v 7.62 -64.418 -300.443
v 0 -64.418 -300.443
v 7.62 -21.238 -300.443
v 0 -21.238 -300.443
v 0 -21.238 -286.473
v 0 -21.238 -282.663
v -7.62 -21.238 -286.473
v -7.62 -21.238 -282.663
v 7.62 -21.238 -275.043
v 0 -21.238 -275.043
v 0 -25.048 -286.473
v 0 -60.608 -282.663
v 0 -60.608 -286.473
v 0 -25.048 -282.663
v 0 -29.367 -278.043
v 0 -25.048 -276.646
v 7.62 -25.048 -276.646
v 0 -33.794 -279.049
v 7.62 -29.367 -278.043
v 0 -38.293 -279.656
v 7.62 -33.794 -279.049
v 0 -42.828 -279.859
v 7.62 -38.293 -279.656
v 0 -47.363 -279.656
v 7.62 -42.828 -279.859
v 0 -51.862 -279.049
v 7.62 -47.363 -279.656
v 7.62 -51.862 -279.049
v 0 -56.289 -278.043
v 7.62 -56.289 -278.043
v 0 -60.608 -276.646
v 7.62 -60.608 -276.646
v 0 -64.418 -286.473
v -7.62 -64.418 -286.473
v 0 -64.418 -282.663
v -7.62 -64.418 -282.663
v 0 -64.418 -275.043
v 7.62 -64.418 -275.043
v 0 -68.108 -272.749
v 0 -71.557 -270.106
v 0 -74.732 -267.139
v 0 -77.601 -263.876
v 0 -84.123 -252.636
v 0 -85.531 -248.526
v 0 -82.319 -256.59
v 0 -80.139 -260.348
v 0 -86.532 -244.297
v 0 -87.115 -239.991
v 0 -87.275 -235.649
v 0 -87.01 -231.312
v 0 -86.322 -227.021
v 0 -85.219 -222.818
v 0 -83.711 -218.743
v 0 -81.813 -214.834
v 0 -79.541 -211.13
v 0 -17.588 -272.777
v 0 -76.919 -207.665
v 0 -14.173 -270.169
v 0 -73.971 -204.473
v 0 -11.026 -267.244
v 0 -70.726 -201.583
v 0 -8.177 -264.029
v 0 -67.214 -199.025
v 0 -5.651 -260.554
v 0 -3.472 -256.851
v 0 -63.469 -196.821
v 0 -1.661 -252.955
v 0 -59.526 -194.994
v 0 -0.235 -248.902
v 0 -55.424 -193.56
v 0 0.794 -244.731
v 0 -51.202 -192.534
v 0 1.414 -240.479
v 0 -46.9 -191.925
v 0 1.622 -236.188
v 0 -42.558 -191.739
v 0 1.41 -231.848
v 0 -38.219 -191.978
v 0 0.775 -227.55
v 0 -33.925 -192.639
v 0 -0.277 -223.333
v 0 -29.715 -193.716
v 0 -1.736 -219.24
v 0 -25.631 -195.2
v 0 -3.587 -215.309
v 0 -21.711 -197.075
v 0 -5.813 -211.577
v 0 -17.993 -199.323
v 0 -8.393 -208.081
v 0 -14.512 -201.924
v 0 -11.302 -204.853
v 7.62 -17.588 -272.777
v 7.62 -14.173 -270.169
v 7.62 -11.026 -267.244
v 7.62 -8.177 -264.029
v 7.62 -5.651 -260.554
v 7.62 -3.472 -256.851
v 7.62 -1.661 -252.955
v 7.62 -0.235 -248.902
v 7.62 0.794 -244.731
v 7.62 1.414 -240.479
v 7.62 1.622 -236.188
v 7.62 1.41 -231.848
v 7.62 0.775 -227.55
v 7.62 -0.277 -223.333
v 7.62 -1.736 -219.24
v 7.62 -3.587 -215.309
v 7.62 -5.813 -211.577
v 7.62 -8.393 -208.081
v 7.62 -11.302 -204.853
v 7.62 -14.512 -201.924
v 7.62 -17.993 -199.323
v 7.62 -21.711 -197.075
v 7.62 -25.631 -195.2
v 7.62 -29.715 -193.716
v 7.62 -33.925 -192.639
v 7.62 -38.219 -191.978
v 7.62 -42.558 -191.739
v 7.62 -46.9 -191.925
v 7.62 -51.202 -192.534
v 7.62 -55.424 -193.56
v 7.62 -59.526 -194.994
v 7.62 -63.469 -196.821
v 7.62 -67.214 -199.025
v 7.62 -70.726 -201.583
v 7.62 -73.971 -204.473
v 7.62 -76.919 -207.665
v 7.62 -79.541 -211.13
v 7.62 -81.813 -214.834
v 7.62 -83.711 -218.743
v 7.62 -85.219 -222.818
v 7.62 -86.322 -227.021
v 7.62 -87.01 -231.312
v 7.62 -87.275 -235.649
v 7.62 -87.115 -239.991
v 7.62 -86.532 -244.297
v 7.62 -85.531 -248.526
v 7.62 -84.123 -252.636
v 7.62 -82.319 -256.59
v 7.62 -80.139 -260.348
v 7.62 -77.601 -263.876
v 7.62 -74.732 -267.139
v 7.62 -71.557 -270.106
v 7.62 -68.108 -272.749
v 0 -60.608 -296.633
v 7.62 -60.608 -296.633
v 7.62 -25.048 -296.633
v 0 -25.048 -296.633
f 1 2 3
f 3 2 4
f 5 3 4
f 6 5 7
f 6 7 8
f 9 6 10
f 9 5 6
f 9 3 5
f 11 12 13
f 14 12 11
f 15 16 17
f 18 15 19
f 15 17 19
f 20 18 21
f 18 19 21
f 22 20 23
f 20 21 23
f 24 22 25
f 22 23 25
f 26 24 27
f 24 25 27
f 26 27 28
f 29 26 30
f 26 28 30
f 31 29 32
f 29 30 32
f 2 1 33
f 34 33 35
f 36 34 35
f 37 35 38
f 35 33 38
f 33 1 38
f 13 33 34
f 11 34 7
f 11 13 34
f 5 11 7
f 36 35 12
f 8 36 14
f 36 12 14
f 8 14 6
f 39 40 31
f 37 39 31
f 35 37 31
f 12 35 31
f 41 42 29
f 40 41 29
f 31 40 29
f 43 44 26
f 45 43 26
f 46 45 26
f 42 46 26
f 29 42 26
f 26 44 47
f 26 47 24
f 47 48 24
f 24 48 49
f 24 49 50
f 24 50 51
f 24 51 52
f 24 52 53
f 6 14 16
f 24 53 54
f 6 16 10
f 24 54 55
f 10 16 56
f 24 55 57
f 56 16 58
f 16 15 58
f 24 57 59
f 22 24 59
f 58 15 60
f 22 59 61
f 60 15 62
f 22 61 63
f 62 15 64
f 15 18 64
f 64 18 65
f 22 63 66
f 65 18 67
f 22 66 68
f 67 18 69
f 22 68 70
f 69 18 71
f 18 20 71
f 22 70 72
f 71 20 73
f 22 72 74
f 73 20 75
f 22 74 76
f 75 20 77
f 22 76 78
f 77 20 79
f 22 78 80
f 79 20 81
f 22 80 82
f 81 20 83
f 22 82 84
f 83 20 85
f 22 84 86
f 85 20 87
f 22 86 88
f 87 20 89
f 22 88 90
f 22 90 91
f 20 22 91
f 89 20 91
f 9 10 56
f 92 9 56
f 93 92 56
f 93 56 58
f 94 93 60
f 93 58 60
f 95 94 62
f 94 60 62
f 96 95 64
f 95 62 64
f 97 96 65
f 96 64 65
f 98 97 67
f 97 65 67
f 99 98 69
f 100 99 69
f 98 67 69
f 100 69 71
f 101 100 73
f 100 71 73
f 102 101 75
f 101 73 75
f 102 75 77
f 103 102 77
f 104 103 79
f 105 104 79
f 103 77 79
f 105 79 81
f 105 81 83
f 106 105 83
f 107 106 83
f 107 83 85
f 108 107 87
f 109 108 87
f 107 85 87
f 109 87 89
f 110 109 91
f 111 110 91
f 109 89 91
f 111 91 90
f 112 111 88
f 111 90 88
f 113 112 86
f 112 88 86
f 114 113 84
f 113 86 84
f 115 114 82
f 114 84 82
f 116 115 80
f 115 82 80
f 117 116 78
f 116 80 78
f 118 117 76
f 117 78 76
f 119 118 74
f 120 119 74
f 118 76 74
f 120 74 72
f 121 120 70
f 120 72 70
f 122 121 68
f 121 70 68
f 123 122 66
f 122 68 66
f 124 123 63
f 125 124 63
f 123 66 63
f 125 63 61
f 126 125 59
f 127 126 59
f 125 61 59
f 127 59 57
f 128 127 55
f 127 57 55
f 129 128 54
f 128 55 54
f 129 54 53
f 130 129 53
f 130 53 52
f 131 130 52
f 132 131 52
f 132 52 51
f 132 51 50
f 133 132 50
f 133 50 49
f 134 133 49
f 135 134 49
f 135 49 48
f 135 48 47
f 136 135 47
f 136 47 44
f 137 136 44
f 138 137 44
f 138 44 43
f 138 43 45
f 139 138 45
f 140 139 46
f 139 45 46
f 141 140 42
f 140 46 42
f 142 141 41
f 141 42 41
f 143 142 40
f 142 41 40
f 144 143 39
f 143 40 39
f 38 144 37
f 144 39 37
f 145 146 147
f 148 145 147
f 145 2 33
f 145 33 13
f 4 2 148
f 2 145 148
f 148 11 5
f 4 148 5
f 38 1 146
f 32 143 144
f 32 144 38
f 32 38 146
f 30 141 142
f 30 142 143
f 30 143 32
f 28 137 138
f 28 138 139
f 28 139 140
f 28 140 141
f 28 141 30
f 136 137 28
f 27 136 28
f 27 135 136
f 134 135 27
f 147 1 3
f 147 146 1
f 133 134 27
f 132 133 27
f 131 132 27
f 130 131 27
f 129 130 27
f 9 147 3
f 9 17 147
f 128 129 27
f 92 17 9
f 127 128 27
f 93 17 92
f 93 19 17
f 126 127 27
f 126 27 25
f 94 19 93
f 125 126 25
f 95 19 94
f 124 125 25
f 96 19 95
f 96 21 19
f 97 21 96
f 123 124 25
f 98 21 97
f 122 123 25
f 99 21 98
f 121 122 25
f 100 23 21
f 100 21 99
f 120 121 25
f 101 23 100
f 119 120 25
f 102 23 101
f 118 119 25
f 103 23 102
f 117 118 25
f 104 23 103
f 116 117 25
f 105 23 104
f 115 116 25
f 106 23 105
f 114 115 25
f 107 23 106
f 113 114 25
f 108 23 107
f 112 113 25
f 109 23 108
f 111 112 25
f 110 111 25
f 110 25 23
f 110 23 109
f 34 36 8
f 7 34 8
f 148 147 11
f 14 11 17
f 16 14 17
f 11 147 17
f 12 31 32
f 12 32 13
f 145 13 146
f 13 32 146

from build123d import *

# Parameters (mm, degrees)
F0_R     = 31.75
F0_W     = 43.18
F0_H     = 13.97
F0_H_2   = 3.81
F1_DEPTH = 7.62
F3_DEPTH = 7.62
F4_DEPTH = 76.2
F5_DEPTH = 7.62


with BuildPart() as f1:
    # F0 (on Right) → F1 (new body)
    with BuildSketch(Plane.YZ):
        with BuildLine():
            ThreePointArc((-21.2379042244, -275.0427409069), (-4.5168222767, -258.7284761869), (1.6220957756, -236.1882122133))
            ThreePointArc((1.6220957756, -236.1882122133), (-65.368168198, -197.8771302656), (-64.4179042244, -275.0427409069))
            Line((-64.4179042244, -275.0427409069), (-21.2379042244, -275.0427409069))
        make_face()
        with Locations((-42.8279042244, -236.1882122133)):
            Circle(F0_R, mode=Mode.SUBTRACT)
        with Locations((-42.8279042244, -236.1882122133)):
            Circle(F0_R)
        with Locations((-42.8279042244, -293.4577409069)):
            Rectangle(F0_W, F0_H)
        with BuildLine():
            ThreePointArc((-21.2379042244, -275.0427409069), (-42.8279042244, -280.6382122133), (-64.4179042244, -275.0427409069))
            Line((-64.4179042244, -275.0427409069), (-64.4179042244, -282.6627409069))
            Line((-64.4179042244, -282.6627409069), (-21.2379042244, -282.6627409069))
            Line((-21.2379042244, -282.6627409069), (-21.2379042244, -275.0427409069))
        make_face()
        with Locations((-42.8279042244, -284.5677409069)):
            Rectangle(F0_W, F0_H_2)
        with BuildLine():
            Line((-21.2379042244, -275.0427409069), (-64.4179042244, -275.0427409069))
            ThreePointArc((-64.4179042244, -275.0427409069), (-42.8279042244, -280.6382122133), (-21.2379042244, -275.0427409069))
        make_face()
    extrude(amount=F1_DEPTH)

    # F0 (on Right) → F3 (join)
    with BuildSketch(Plane.YZ):
        with BuildLine():
            ThreePointArc((-21.2379042244, -275.0427409069), (-4.5168222767, -258.7284761869), (1.6220957756, -236.1882122133))
            ThreePointArc((1.6220957756, -236.1882122133), (-65.368168198, -197.8771302656), (-64.4179042244, -275.0427409069))
            Line((-64.4179042244, -275.0427409069), (-21.2379042244, -275.0427409069))
        make_face()
        with Locations((-42.8279042244, -236.1882122133)):
            Circle(F0_R, mode=Mode.SUBTRACT)
    extrude(amount=F3_DEPTH)

    # F2 (on face) → F4 (cut)
    with BuildSketch(Plane.YZ.offset(7.62)):
        with BuildLine():
            Line((-60.6079042244, -276.6458034995), (-60.6079042244, -296.6327409069))
            Line((-60.6079042244, -296.6327409069), (-25.0479042244, -296.6327409069))
            Line((-25.0479042244, -296.6327409069), (-25.0479042244, -276.6458034995))
            ThreePointArc((-25.0479042244, -276.6458034995), (-42.8279042244, -279.8589187517), (-60.6079042244, -276.6458034995))
        make_face()
    extrude(amount=-F4_DEPTH, mode=Mode.SUBTRACT)

    # F0 (on Right) → F5 (join)
    with BuildSketch(Plane.YZ):
        with Locations((-42.8279042244, -284.5677409069)):
            Rectangle(F0_W, F0_H_2)
    extrude(amount=-F5_DEPTH)


solid = f1.part
